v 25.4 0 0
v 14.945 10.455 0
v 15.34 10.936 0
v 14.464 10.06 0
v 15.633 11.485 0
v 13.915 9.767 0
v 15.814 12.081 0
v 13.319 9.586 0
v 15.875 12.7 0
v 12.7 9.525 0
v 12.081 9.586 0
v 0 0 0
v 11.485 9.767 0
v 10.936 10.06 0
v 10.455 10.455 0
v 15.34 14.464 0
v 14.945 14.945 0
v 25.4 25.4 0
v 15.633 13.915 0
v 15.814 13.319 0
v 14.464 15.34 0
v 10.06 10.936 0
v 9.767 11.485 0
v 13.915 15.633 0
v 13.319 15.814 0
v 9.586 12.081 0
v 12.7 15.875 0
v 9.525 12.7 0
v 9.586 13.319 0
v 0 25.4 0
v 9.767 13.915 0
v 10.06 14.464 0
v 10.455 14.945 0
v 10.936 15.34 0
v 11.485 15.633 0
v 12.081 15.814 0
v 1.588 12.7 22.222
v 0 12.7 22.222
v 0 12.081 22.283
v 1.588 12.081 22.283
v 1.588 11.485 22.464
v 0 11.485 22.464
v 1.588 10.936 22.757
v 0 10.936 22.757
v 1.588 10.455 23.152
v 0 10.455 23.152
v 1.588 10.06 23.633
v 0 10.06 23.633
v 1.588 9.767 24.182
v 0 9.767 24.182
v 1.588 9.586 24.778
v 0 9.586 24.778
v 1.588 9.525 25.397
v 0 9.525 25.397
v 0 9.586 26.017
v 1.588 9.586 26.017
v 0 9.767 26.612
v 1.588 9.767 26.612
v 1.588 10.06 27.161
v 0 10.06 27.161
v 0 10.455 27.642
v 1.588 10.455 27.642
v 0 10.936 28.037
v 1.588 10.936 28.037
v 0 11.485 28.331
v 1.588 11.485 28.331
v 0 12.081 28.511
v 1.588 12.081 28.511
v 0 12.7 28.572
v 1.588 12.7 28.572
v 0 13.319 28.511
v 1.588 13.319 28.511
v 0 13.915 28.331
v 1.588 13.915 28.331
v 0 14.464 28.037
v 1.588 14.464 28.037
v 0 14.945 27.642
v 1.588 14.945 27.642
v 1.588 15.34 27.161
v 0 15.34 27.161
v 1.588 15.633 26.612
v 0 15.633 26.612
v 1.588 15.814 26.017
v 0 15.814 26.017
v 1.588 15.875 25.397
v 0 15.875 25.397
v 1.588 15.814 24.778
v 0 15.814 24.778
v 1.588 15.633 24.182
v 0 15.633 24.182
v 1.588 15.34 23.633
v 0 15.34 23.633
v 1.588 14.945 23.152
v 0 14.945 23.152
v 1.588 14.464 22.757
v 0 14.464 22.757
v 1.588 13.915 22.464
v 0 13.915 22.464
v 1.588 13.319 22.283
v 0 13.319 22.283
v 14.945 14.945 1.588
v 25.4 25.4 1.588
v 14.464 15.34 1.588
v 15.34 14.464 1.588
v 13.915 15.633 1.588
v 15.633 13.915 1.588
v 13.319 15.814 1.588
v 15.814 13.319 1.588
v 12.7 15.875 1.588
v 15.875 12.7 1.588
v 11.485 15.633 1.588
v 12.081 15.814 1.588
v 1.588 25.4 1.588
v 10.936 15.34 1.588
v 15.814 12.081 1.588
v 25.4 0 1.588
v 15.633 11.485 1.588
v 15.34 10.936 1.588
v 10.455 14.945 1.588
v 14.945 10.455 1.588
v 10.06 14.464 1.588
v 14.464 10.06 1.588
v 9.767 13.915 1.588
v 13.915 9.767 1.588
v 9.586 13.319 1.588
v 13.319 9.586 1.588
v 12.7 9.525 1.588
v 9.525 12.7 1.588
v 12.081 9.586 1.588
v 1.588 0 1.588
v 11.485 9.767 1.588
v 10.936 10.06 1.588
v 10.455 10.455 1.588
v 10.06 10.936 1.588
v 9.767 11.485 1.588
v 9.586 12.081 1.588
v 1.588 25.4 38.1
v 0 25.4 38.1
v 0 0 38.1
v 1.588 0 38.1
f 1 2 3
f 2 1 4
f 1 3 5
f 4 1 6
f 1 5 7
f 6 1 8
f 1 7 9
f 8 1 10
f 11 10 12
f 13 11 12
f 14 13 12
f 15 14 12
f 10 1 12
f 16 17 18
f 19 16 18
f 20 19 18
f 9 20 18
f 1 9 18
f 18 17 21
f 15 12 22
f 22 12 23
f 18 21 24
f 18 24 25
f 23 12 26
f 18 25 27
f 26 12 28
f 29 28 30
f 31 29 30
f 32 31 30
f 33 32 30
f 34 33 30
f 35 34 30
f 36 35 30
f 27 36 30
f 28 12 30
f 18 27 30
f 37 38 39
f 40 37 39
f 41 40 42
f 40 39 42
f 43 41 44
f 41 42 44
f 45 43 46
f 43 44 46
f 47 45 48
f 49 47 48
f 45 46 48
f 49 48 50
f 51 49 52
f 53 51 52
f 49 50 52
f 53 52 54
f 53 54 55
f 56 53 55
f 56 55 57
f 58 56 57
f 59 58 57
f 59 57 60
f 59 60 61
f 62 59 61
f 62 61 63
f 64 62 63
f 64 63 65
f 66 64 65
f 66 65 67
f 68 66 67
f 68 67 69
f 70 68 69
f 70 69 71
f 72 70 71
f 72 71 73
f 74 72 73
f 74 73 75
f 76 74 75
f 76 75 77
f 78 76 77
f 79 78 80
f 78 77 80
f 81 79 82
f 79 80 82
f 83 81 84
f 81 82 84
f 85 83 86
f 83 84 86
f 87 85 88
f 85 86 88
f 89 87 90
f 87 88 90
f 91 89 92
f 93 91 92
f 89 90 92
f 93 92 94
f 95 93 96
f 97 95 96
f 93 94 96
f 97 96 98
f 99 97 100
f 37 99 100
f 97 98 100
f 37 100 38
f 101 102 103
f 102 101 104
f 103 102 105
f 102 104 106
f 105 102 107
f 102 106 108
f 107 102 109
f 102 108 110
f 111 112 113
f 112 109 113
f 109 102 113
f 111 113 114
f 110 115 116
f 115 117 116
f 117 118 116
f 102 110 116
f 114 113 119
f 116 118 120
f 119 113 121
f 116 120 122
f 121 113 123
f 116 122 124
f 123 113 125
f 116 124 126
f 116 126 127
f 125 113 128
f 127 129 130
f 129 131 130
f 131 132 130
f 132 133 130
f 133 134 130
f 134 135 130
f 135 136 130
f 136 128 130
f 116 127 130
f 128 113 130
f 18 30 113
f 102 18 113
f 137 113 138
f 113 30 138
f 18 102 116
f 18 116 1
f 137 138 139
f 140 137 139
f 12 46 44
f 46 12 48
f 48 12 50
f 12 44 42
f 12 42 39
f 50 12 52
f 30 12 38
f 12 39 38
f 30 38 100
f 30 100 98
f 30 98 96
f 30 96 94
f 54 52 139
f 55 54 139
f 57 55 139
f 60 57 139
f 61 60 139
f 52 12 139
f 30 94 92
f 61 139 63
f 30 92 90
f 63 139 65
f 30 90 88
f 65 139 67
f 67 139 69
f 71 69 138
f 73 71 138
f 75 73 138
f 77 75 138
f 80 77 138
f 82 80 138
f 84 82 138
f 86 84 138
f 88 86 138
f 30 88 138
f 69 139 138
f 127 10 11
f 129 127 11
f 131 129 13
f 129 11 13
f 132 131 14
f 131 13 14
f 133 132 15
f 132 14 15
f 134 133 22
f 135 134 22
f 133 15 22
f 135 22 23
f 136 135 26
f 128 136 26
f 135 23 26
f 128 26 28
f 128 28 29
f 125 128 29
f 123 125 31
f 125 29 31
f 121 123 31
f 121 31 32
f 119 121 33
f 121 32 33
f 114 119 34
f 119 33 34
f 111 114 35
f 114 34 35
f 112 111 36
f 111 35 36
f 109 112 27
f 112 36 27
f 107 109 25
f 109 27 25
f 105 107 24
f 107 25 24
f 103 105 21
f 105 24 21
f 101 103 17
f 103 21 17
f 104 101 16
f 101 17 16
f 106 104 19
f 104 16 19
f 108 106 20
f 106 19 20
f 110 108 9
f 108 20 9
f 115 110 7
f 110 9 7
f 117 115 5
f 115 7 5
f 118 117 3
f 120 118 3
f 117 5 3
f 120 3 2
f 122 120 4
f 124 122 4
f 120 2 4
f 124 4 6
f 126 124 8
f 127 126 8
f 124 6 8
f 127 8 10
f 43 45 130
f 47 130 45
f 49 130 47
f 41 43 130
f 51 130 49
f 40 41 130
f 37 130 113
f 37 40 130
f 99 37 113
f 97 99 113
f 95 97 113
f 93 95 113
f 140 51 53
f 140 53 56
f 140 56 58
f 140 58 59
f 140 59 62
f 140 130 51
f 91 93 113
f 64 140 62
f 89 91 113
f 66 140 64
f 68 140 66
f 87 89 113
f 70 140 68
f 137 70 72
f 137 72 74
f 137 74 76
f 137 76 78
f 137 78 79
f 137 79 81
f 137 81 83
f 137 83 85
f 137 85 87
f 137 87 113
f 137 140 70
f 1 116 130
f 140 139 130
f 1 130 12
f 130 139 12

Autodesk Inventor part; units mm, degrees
ref_plane "YZ Plane" through (0, 0, 0) normal (1, 0, 0) x (0, 1, 0)
ref_plane "XZ Plane" through (0, 0, 0) normal (0, 1, 0) x (-1, 0, 0)
ref_plane "XY Plane" through (0, 0, 0) normal (0, 0, 1) x (1, 0, 0)
sketch "Sketch1" plane through (0, 0, 0) normal (1, 0, 0) x (0, 1, 0)
  line L0 (0, 0) -> (25.4, 0)
  line L1 (25.4, 0) -> (25.4, 38.1)
  line L2 (25.4, 38.1) -> (0, 38.1)
  line L3 (0, 38.1) -> (0, 0)
  dimension "d0" = 25.4
  dimension "d1" = 38.1
extrude "Extrusion1" add sketch "Sketch1" along normal blind 1.5875
sketch "Sketch2" plane through (1.5875, 0, 0) normal (1, 0, 0) x (0, 0, -1)
  line L0 (-38.1, 0) -> (0, 0) projected
  line L1 (0, 25.4) -> (-1.5875, 25.4)
  line L2 (-1.5875, 25.4) -> (-1.5875, 0)
  line L3 (-1.5875, 0) -> (0, 0)
  line L4 (0, 0) -> (0, 25.4)
  dimension "d4" = 1.5875
extrude "Extrusion2" add sketch "Sketch2" along normal blind 23.8125
sketch "Sketch3" plane through (1.5875, 0, 0) normal (1, 0, 0) x (0, 0, -1)
  line L0 (-1.5875, 25.4) -> (-38.1, 25.4) projected
  line L1 (-38.1, 25.4) -> (-38.1, 0) projected
  point P0 (0, 0)
  point P1 (-25.3973, 12.7)
  dimension "d8" = 12.7027
  dimension "d9" = 12.7
hole "Hole1" at (1.5875, 12.7, 25.3973) direction (-1, 0, 0) diameter 6.35 end through all
sketch "Sketch4" plane through (1.5875, 0, 1.5875) normal (0, 0, 1) x (1, 0, 0)
  line L0 (23.8125, 25.4) -> (23.8125, 0) projected
  line L1 (0, 25.4) -> (23.8125, 25.4) projected
  point P0 (-1.5875, 0)
  point P1 (11.1125, 12.7)
  dimension "d17" = 12.7
  dimension "d18" = 12.7
hole "Hole2" at (12.7, 12.7, 1.5875) direction (0, 0, -1) diameter 6.35 end through all
properties part number "LBrace" material "Aluminum 6061"
